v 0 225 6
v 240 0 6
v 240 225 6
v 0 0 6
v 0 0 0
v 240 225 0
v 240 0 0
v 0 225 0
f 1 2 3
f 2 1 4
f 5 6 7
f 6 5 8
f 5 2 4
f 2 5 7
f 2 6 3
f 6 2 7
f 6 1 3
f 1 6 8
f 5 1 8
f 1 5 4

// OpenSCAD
// Rectangular block, dimensions in millimetres.
length_x = 240;
width_y = 225;
thickness_z = 6;

cube([length_x, width_y, thickness_z], center = false);
